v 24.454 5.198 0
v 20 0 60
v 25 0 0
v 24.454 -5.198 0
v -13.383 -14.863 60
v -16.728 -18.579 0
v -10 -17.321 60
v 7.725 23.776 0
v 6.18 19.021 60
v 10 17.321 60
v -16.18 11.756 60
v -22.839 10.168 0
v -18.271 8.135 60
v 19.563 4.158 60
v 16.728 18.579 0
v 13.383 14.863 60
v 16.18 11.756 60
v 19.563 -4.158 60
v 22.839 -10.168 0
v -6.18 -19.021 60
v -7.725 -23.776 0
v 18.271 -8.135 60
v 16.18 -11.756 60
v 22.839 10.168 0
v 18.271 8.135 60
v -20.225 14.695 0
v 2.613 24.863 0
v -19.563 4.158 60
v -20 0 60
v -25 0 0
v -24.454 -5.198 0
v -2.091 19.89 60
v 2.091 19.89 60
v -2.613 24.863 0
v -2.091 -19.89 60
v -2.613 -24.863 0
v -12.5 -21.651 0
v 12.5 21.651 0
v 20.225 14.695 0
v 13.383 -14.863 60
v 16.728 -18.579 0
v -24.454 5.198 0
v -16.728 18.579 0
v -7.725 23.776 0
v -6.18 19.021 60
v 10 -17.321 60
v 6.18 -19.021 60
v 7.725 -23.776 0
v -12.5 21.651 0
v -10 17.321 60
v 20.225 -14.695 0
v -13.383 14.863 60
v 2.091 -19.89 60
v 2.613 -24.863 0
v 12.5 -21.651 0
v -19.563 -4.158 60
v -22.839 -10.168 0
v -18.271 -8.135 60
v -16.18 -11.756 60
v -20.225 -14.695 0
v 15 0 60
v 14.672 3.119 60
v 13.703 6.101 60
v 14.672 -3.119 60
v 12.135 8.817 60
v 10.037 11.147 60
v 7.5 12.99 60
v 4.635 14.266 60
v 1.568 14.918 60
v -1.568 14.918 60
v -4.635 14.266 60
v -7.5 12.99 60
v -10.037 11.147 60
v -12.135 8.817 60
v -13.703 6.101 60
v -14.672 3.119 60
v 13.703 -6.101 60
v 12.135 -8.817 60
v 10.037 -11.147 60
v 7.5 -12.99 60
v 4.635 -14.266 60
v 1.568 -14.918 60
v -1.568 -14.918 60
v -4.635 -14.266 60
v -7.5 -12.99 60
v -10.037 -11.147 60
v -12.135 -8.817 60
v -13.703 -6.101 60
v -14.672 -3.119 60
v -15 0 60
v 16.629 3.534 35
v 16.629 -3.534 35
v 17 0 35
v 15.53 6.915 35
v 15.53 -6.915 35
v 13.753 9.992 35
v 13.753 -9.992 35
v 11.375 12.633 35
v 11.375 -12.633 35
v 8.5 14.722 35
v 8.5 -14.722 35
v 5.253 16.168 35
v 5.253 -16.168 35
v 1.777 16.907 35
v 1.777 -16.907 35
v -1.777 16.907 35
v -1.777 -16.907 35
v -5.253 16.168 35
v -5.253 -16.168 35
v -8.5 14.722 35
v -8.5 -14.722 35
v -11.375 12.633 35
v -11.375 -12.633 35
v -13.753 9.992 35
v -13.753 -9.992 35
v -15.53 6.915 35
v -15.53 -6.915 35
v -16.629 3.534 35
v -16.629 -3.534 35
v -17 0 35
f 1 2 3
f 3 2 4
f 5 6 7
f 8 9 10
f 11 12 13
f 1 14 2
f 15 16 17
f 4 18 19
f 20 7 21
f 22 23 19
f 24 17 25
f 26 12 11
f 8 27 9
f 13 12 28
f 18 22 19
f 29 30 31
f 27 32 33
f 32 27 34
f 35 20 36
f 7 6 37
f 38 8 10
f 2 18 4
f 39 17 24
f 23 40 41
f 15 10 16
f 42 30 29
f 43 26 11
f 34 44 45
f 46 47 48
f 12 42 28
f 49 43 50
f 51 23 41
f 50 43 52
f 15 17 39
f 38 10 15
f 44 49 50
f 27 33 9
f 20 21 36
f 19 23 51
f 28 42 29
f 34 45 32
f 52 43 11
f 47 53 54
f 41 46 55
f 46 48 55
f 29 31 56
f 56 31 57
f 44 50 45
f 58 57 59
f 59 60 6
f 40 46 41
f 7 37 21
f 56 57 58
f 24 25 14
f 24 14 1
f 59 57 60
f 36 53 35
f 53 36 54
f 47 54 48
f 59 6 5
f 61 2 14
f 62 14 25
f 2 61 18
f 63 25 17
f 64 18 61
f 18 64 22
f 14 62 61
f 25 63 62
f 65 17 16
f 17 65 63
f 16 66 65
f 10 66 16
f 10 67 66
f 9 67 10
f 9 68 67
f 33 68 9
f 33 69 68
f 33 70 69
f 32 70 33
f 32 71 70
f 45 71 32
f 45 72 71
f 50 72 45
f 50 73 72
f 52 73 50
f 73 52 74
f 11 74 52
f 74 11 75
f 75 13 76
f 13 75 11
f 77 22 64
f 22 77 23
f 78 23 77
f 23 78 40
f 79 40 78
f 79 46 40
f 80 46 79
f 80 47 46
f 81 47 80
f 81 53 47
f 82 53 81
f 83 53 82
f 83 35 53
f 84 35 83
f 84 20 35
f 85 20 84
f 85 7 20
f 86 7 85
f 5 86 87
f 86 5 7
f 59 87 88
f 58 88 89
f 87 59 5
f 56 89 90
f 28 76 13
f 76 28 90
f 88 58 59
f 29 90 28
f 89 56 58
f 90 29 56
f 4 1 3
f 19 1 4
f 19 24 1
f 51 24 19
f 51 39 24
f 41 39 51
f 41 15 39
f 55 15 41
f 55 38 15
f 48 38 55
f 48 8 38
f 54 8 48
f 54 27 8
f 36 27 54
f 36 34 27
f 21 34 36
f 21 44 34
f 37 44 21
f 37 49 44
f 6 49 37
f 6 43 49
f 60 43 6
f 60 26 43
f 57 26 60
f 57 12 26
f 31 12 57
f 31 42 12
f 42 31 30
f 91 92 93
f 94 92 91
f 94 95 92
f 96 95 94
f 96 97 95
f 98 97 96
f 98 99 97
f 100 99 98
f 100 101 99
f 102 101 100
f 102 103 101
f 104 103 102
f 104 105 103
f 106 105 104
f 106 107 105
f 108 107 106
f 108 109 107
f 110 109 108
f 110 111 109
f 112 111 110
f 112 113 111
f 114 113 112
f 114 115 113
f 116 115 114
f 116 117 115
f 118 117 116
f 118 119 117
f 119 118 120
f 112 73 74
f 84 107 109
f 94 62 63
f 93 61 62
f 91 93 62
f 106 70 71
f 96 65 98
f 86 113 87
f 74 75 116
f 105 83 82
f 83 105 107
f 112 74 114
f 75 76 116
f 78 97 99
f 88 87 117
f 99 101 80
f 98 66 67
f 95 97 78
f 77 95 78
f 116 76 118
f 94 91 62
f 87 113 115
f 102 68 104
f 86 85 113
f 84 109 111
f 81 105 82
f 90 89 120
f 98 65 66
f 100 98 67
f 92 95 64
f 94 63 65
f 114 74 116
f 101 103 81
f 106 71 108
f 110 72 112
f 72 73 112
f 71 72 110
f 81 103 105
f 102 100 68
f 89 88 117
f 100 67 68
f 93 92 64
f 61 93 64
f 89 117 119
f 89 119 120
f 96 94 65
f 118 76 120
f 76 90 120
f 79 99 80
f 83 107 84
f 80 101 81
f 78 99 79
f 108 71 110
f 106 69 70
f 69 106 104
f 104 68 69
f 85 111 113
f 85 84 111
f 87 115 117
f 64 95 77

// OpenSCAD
leg_height = 60;
leg_base = 25;
leg_top = 20;

inset_height = 25;
inset_base = 17;
inset_top = 15;

difference() {
    cylinder(leg_height, leg_base, leg_top, false);
    translate([0, 0, leg_height - inset_height])
    cylinder(inset_height, inset_base, inset_top, false);
}
